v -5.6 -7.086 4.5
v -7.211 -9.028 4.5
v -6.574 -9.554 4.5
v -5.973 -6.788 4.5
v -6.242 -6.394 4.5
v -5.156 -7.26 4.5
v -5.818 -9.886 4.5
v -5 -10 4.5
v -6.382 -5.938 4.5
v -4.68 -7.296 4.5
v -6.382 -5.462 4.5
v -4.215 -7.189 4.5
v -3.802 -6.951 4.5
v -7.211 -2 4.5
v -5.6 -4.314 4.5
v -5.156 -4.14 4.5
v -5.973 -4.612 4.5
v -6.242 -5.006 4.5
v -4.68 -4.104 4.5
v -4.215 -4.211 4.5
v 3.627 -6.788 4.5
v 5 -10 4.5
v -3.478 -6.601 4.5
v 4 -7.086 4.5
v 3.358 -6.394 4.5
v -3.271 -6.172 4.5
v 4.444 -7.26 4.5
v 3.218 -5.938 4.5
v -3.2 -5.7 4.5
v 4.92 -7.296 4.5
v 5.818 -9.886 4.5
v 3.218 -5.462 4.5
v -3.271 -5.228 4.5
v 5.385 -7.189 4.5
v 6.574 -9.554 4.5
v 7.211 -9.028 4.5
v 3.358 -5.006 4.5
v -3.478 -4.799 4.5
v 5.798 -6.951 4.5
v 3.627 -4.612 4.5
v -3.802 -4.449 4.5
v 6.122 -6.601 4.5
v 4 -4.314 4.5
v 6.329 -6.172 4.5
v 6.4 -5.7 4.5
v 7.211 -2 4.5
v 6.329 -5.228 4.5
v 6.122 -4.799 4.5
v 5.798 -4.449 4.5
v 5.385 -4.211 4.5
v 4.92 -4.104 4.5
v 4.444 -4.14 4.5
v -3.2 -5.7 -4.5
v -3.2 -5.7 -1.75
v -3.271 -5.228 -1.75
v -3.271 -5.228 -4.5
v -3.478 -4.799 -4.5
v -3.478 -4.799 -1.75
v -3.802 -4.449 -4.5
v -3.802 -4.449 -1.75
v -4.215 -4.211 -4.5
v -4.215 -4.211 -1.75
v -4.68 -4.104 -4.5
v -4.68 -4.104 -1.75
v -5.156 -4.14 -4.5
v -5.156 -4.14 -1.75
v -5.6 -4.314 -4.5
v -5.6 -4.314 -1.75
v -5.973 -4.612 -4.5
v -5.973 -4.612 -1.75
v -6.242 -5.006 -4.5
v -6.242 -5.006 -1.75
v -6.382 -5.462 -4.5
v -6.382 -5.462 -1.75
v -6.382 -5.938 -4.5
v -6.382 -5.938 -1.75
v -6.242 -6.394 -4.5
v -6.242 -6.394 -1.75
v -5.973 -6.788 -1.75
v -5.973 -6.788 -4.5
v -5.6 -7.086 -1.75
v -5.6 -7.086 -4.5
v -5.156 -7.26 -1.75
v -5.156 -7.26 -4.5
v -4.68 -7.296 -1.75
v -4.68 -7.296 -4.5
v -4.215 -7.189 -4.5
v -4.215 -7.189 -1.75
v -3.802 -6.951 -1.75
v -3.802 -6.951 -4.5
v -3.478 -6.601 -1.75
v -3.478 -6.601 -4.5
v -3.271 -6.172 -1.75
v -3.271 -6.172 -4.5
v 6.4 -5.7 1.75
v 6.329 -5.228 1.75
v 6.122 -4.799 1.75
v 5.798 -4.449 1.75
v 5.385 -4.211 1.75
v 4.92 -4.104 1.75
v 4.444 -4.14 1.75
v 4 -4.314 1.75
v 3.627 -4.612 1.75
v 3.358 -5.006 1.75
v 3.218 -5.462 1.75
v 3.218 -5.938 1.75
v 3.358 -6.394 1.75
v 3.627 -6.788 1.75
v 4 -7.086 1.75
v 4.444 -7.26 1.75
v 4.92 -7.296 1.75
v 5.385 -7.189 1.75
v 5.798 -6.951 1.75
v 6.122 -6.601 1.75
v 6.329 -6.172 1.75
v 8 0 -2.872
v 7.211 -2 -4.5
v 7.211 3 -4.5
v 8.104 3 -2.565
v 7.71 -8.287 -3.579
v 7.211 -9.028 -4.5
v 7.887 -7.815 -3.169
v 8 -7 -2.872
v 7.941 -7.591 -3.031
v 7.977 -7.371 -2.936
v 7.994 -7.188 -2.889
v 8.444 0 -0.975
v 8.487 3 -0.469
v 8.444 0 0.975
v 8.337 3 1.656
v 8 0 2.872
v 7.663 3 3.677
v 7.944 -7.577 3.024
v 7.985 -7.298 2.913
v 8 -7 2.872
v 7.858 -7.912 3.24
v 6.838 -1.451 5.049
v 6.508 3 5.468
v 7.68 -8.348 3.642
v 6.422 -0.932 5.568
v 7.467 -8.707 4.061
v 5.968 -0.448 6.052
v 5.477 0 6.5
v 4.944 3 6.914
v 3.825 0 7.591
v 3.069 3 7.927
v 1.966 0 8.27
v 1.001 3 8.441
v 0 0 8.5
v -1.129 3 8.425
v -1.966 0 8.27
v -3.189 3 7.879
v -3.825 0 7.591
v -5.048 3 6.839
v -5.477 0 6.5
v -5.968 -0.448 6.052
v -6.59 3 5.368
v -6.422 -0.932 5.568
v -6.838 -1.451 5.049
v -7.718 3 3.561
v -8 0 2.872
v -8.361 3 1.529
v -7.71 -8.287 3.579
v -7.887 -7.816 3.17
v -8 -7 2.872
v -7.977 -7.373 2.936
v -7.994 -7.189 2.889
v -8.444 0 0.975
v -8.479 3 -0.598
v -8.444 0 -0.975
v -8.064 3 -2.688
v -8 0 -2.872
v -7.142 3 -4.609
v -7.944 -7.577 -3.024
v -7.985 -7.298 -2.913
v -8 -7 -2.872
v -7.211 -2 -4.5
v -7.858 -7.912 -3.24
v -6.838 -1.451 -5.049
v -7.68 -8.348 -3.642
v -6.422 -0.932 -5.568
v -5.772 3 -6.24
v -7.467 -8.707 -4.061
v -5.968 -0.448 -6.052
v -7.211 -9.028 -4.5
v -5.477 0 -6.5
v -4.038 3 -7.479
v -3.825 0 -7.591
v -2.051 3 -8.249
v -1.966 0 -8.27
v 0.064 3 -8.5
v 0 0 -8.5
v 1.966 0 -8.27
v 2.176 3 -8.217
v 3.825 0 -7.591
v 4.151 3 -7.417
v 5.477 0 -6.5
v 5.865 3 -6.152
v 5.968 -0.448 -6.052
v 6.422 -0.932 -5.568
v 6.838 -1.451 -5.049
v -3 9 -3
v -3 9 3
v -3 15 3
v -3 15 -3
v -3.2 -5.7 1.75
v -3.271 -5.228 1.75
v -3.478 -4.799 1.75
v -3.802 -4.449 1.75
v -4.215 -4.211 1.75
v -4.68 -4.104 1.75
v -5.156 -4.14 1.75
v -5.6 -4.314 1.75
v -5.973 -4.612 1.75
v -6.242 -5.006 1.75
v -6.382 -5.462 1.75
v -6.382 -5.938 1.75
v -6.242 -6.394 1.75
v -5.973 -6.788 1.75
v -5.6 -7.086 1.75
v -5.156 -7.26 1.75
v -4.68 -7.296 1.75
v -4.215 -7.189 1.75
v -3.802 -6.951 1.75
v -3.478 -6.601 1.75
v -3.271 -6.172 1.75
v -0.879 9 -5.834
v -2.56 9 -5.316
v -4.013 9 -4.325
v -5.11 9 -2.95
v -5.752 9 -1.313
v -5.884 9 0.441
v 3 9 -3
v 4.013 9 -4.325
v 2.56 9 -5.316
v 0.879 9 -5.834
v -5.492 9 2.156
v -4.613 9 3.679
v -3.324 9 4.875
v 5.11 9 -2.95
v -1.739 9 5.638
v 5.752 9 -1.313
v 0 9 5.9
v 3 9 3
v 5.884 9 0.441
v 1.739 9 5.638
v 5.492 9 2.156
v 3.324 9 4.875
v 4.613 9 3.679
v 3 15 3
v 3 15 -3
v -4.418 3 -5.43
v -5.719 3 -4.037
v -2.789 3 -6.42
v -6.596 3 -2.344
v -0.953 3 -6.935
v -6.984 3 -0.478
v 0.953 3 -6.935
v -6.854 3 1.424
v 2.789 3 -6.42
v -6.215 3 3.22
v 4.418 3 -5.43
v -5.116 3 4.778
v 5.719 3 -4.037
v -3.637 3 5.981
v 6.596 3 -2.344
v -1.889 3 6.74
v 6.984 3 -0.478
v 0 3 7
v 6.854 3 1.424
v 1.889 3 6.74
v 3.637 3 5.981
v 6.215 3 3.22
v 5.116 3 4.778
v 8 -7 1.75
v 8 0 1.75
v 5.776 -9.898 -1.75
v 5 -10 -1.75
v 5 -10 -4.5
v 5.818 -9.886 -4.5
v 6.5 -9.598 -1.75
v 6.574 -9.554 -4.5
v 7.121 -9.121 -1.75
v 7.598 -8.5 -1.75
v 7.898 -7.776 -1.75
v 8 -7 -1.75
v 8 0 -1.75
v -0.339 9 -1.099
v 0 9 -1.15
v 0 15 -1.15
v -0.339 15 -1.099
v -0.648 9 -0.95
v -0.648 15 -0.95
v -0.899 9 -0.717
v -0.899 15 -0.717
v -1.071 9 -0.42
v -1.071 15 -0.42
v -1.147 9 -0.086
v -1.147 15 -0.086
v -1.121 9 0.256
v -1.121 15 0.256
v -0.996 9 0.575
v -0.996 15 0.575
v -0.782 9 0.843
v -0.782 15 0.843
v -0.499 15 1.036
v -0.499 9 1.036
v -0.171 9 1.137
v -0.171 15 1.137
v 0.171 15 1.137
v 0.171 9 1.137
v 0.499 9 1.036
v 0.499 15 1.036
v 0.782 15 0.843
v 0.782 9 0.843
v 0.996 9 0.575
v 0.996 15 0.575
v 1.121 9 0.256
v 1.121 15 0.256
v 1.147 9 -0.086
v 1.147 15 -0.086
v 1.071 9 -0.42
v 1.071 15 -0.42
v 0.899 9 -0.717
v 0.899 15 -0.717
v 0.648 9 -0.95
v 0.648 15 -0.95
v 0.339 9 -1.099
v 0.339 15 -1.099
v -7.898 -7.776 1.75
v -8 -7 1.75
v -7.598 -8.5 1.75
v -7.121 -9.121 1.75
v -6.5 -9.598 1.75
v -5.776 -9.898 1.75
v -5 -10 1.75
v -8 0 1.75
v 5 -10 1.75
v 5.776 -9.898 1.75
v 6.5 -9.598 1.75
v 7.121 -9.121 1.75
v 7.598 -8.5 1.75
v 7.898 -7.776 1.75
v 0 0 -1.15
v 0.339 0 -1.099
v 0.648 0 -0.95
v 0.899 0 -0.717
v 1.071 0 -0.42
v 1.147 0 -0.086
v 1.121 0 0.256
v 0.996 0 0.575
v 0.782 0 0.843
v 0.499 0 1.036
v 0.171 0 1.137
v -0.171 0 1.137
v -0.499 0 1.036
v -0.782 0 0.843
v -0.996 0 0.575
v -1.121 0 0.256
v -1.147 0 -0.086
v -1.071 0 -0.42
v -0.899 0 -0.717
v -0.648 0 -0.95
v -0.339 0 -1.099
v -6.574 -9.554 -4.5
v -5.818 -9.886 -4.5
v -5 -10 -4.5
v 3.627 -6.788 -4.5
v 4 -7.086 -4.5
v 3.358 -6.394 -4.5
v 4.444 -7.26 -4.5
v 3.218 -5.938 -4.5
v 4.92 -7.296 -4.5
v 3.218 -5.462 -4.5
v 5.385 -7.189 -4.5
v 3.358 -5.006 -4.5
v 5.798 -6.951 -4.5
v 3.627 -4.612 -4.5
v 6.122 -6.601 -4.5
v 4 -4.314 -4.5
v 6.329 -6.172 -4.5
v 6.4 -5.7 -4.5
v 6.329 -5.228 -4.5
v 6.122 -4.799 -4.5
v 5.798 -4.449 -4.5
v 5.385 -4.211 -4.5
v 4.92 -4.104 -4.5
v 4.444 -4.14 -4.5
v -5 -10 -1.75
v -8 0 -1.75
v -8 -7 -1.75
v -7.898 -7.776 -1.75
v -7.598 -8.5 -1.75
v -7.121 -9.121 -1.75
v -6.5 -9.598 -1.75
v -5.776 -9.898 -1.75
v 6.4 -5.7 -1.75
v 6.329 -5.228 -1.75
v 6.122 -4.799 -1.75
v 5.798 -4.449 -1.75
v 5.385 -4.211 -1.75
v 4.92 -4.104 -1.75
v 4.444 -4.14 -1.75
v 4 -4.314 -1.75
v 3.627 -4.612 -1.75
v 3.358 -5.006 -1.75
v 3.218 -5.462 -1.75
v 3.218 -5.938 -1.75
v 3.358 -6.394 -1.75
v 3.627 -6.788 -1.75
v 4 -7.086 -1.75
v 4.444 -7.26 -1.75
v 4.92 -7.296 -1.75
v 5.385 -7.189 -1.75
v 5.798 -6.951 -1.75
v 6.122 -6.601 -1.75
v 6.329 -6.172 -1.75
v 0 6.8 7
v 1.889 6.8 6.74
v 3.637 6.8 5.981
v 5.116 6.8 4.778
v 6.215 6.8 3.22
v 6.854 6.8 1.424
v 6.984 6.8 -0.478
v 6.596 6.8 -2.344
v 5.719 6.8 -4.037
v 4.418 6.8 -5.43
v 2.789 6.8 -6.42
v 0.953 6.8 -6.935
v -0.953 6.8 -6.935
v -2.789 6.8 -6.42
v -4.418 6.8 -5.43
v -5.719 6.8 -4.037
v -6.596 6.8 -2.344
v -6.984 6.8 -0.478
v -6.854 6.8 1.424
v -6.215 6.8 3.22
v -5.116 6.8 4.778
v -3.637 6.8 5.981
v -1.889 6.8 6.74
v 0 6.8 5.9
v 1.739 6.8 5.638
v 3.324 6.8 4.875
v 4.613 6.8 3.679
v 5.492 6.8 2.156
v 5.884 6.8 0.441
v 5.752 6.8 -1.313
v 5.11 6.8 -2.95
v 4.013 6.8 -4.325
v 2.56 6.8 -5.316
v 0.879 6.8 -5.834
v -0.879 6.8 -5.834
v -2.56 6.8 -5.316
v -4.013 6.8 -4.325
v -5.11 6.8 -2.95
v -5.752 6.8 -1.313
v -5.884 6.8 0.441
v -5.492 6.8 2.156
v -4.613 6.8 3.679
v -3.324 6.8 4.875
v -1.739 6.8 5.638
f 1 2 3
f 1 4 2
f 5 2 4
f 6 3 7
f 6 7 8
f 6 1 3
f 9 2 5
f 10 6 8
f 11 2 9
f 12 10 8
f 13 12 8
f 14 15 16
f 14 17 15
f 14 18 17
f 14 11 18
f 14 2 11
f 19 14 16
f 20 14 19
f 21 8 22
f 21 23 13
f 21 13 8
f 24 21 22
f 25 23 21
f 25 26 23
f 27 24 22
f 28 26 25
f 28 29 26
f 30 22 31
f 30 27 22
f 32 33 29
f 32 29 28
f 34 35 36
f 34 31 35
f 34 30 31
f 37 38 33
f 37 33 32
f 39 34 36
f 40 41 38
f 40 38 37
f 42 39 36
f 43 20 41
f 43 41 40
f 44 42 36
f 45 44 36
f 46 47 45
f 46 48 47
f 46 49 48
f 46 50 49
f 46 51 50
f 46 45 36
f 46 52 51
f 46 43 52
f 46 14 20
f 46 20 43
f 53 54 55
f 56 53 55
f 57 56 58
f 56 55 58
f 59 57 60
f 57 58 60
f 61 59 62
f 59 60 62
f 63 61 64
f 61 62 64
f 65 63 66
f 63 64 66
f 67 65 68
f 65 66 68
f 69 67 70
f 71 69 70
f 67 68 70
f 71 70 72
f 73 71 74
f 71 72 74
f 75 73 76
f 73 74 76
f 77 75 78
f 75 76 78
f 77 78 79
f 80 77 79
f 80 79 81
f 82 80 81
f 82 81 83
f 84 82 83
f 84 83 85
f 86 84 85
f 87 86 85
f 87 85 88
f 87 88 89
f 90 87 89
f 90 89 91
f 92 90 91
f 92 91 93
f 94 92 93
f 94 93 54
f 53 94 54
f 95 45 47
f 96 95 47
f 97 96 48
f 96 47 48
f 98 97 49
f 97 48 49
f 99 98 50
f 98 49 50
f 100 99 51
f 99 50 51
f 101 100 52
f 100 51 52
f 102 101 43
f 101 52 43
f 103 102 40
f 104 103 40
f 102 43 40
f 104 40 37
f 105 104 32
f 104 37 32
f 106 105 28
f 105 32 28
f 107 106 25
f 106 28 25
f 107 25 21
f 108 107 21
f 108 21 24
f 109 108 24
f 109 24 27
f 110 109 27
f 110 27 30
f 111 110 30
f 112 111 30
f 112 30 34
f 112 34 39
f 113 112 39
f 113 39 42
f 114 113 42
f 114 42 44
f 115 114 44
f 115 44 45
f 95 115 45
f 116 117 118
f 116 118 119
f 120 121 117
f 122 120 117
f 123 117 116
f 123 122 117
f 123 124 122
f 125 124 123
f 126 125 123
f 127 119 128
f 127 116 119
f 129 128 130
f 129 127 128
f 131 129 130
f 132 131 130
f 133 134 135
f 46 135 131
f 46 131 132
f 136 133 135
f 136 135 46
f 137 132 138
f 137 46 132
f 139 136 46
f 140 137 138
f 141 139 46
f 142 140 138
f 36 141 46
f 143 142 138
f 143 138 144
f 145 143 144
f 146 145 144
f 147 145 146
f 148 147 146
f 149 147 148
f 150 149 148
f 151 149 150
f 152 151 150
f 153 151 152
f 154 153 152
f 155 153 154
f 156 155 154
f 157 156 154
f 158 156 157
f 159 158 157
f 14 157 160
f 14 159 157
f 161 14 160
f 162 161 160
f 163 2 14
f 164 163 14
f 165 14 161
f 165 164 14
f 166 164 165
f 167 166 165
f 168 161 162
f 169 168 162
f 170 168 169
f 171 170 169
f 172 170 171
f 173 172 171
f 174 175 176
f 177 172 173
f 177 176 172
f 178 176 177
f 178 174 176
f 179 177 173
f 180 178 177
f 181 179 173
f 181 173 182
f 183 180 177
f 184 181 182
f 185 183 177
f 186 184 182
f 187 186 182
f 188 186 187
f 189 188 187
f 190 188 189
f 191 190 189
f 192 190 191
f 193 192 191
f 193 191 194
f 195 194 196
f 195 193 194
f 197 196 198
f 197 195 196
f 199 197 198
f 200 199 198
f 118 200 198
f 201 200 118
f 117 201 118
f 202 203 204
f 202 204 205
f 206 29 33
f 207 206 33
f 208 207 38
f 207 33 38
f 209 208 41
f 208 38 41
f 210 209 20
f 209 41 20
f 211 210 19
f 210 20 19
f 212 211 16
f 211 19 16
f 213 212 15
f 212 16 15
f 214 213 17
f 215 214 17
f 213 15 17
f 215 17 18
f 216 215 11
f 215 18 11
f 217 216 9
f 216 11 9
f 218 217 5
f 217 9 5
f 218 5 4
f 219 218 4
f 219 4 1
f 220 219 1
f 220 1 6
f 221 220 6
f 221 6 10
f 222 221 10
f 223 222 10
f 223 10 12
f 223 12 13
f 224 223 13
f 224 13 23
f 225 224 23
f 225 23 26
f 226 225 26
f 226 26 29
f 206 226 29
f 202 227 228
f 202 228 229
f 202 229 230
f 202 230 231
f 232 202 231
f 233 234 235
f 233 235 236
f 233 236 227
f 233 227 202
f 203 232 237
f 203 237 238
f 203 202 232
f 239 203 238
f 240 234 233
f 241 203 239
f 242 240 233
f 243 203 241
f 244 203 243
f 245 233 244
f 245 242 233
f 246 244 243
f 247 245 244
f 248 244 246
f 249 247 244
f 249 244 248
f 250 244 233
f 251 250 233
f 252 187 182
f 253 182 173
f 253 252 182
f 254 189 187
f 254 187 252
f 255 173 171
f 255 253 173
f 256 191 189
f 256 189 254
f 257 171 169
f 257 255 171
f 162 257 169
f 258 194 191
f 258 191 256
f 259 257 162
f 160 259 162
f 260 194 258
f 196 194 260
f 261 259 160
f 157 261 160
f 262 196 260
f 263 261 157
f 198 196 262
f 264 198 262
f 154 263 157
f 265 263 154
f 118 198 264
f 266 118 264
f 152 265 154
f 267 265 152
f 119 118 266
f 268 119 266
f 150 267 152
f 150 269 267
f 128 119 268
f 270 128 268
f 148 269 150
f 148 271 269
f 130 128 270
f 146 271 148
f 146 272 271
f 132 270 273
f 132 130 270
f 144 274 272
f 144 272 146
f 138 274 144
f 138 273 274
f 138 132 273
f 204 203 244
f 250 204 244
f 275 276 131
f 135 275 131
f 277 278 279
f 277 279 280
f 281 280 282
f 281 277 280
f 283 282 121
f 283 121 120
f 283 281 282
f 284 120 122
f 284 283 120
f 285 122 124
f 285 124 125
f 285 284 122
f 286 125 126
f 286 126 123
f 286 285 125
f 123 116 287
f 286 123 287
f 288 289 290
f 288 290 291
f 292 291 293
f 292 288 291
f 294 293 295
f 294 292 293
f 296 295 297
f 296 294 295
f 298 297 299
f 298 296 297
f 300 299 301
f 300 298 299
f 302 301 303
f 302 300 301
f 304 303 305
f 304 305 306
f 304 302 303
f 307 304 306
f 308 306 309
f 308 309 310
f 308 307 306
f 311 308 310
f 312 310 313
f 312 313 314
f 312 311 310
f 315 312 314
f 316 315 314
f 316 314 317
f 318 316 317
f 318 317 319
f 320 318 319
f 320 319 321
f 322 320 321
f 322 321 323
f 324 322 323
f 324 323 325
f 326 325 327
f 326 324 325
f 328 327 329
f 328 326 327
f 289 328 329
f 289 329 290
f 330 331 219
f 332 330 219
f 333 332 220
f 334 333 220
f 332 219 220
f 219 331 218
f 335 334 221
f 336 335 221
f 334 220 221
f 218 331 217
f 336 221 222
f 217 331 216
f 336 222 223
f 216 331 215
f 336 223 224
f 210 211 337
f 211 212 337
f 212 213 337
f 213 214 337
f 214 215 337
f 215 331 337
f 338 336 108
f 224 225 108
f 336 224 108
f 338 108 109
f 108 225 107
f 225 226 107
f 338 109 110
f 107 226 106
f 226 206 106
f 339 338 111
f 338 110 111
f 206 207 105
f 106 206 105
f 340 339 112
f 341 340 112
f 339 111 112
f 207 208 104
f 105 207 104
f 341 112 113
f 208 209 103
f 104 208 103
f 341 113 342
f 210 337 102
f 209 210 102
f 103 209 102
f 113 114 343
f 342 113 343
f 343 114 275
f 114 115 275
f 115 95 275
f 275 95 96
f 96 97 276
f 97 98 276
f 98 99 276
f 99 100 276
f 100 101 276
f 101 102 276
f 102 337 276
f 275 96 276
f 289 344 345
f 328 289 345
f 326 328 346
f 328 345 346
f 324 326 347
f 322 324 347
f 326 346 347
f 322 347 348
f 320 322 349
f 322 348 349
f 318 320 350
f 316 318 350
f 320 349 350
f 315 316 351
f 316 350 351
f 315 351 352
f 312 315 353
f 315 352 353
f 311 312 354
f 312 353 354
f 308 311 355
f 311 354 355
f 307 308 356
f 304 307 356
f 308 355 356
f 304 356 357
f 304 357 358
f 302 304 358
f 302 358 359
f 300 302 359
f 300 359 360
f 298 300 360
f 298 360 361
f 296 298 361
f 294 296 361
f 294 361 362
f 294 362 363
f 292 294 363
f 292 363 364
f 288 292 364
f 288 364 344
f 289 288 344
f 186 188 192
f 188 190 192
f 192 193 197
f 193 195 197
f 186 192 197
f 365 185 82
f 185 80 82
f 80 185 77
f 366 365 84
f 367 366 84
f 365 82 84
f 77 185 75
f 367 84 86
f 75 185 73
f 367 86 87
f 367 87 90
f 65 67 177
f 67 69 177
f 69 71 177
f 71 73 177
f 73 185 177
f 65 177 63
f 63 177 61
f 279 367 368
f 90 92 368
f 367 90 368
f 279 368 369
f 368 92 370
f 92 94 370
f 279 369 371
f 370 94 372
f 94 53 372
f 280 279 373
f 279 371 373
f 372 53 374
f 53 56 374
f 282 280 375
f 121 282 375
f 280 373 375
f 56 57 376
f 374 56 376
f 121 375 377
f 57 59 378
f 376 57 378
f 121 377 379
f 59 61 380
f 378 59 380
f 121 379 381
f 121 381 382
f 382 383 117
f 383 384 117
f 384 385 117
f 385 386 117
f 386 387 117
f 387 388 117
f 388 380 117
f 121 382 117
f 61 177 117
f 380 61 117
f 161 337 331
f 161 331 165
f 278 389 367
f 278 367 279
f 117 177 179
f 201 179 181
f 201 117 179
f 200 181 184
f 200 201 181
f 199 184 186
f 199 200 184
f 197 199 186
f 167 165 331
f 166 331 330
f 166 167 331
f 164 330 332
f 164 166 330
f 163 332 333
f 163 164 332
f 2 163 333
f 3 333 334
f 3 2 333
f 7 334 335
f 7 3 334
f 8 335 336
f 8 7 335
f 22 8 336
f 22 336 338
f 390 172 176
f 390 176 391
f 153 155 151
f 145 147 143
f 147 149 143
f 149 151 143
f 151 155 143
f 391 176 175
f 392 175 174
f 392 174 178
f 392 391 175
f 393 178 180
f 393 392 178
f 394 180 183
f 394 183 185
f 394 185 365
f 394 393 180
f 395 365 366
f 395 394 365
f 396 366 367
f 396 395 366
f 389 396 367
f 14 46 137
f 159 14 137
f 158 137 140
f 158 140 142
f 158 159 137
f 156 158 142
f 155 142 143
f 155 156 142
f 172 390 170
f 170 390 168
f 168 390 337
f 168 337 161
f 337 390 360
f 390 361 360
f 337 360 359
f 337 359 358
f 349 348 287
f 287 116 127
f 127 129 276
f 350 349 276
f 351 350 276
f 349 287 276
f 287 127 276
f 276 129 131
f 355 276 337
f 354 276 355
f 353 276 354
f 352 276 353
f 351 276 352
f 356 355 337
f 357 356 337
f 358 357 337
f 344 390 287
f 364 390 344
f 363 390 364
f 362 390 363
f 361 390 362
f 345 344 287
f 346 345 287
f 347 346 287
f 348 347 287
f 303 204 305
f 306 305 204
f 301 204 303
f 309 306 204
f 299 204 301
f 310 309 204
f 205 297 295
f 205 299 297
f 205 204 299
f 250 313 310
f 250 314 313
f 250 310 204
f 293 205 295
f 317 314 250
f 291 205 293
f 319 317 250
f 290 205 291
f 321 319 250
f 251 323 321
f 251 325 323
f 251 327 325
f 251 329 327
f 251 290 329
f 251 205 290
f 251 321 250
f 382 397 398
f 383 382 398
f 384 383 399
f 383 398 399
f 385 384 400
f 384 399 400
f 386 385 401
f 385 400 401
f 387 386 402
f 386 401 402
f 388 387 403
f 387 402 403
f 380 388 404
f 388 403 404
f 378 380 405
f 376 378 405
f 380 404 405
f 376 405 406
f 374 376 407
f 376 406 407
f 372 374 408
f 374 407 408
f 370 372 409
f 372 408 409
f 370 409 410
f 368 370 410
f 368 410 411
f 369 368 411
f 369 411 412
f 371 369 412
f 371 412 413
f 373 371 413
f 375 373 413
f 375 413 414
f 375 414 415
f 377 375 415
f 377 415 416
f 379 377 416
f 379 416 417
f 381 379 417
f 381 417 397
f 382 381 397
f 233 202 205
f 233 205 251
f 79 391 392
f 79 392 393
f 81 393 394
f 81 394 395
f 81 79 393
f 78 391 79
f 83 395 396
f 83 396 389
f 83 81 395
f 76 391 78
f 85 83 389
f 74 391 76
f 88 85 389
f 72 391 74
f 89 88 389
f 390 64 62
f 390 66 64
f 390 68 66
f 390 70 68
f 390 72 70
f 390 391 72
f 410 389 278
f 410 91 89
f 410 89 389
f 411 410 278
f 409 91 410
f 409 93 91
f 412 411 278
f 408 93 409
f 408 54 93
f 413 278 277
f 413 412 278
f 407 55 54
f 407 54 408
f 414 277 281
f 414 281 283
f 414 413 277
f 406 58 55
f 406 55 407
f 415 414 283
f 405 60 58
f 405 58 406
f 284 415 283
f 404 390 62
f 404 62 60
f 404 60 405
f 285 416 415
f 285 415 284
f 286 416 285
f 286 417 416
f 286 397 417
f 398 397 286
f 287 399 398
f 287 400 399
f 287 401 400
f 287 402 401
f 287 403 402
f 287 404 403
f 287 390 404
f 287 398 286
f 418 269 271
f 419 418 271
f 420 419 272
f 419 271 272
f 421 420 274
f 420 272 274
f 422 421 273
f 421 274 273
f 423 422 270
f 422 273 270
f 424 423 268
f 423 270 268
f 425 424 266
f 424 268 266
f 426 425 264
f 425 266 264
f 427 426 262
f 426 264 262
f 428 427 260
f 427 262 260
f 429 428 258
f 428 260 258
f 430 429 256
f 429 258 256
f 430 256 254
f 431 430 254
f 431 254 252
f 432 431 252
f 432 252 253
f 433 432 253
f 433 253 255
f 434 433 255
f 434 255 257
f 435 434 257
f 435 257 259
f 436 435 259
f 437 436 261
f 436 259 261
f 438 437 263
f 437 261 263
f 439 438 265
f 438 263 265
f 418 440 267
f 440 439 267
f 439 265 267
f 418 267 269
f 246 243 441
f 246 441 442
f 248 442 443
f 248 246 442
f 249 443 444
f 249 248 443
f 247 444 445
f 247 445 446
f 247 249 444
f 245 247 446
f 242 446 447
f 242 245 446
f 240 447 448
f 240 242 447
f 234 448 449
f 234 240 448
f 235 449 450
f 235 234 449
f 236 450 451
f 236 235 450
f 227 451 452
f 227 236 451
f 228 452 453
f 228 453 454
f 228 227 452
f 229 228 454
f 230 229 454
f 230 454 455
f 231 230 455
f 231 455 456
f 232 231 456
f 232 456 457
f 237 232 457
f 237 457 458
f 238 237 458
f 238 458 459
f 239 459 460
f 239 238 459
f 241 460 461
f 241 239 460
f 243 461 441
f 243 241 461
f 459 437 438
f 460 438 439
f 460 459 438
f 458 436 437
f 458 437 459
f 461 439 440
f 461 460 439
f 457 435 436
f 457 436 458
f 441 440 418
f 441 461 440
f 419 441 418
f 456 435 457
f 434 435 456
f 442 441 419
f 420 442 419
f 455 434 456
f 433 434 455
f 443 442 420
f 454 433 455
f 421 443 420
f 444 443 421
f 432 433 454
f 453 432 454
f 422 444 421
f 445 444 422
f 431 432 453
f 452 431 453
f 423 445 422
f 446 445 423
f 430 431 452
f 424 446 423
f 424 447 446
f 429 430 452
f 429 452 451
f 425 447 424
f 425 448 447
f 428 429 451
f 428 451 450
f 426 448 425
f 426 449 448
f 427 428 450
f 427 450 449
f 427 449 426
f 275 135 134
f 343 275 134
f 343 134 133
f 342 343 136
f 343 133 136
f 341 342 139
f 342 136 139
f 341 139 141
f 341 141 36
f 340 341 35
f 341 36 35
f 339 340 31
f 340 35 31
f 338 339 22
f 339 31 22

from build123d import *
from build123d.topology import SkipClean

# Parameters (mm, degrees)
SKETCH_9_R          = 9
EXTRUDE_4_DEPTH     = 3
SKETCH_10_R         = 7
EXTRUDE_5_DEPTH     = 6
SKETCH_11_W         = 16
SKETCH_11_H         = 3
EXTRUDE_6_DEPTH     = 10
SKETCH_12_R         = 1.6
CUT_EXTRUDE_3_DEPTH = 20.059118553
SKETCH_13_R         = 12.035495365
SKETCH_13_R_2       = 9
CUT_EXTRUDE_4_DEPTH = 30
FILLET_1_R          = 3
SKETCH_14_R         = 1.15
CUT_EXTRUDE_5_DEPTH = 30
SKETCH_15_W         = 22.433214128
SKETCH_15_H         = 3.5
CUT_EXTRUDE_6_DEPTH = 20
SKETCH_17_R         = 12.049205959
SKETCH_17_R_2       = 8.5
CUT_EXTRUDE_7_DEPTH = 20
SKETCH_18_R         = 9.534410067
SKETCH_18_R_2       = 5.9
CUT_EXTRUDE_8_DEPTH = 2.2
SKETCH_20_W         = 6
SKETCH_20_H         = 6
SKETCH_20_R         = 1.15
EXTRUDE_7_DEPTH     = 6
CHAMFER_1_SIZE      = 2


with BuildPart() as part:
    # Эскиз9 → Бобышка-Вытянуть4 (new body)
    with BuildSketch(Plane(origin=(0, 0, 0), x_dir=(1, 0, 0), z_dir=(0, 1, 0))):
        with Locations(Location((0, 0, 0), (0, 0, 270))):
            Circle(SKETCH_9_R)
    extrude(amount=EXTRUDE_4_DEPTH)

    # Эскиз10 → Бобышка-Вытянуть5 (add)
    with BuildSketch(Plane(origin=(0, 3, 0), x_dir=(1, 0, 0), z_dir=(0, 1, 0))):
        with Locations(Location((0, 0, 0), (0, 0, 270))):
            Circle(SKETCH_10_R)
    extrude(amount=EXTRUDE_5_DEPTH)

    # Эскиз11 → Бобышка-Вытянуть6 (add)
    with BuildSketch(Plane.XZ):
        with Locations((0, -3)):
            Rectangle(SKETCH_11_W, SKETCH_11_H)
        with Locations((0, 3)):
            Rectangle(SKETCH_11_W, SKETCH_11_H)
    extrude(amount=EXTRUDE_6_DEPTH)

    # Эскиз12 → Вырез-Вытянуть3 (cut, through all)
    with BuildSketch(Plane.XY.offset(4.5)):
        with Locations((-4.8, -5.7)):
            Circle(SKETCH_12_R)
        with Locations((4.8, -5.7)):
            Circle(SKETCH_12_R)
    extrude(amount=-CUT_EXTRUDE_3_DEPTH, mode=Mode.SUBTRACT)

    # Эскиз13 → Вырез-Вытянуть4 (cut)
    with SkipClean():  # the faces are left unmerged after this step: merging them gives an invalid solid
        with BuildSketch(Plane.XZ.offset(10)):
            Circle(SKETCH_13_R)
            with Locations(Location((0, 0, 0), (0, 0, 210))):
                Circle(SKETCH_13_R_2, mode=Mode.SUBTRACT)
        extrude(amount=-CUT_EXTRUDE_4_DEPTH, mode=Mode.SUBTRACT)
    add(part.part.scale(1), mode=Mode.REPLACE)  # the faces are merged on a copy

    # Скругление1
    fillet_1_edges = [part.edges().sort_by_distance(p)[0] for p in [
        (-8, -10, -2.811552813),
        (8, -10, -2.811552813),
        (8, -10, 2.811552813),
        (-8, -10, 2.811552813),
    ]]
    fillet(fillet_1_edges, radius=FILLET_1_R)

    # Эскиз14 → Вырез-Вытянуть5 (cut)
    with BuildSketch(Plane.XZ):
        with Locations(Location((0, 0, 0), (0, 0, 270))):
            Circle(SKETCH_14_R)
    extrude(amount=-CUT_EXTRUDE_5_DEPTH, mode=Mode.SUBTRACT)

    # Эскиз15 → Вырез-Вытянуть6 (cut)
    with BuildSketch(Plane.XZ):
        Rectangle(SKETCH_15_W, SKETCH_15_H)
    extrude(amount=CUT_EXTRUDE_6_DEPTH, mode=Mode.SUBTRACT)

    # Эскиз17 → Вырез-Вытянуть7 (cut)
    with BuildSketch(Plane.XZ.offset(10)):
        Circle(SKETCH_17_R)
        with Locations(Location((0, 0, 0), (0, 0, 328.034281249))):
            Circle(SKETCH_17_R_2, mode=Mode.SUBTRACT)
    extrude(amount=-CUT_EXTRUDE_7_DEPTH, mode=Mode.SUBTRACT)

    # Эскиз18 → Вырез-Вытянуть8 (cut)
    with BuildSketch(Plane(origin=(0, 9, 0), x_dir=(1, 0, 0), z_dir=(0, 1, 0))):
        Circle(SKETCH_18_R)
        with Locations(Location((0, 0, 0), (0, 0, 270))):
            Circle(SKETCH_18_R_2, mode=Mode.SUBTRACT)
    extrude(amount=-CUT_EXTRUDE_8_DEPTH, mode=Mode.SUBTRACT)

    # Эскиз20 → Бобышка-Вытянуть7 (add)
    with SkipClean():  # the faces are left unmerged after this step: merging them gives an invalid solid
        with BuildSketch(Plane(origin=(0, 9, 0), x_dir=(1, 0, 0), z_dir=(0, 1, 0))):
            Rectangle(SKETCH_20_W, SKETCH_20_H)
            with Locations(Location((0, 0, 0), (0, 0, 90))):
                Circle(SKETCH_20_R, mode=Mode.SUBTRACT)
        extrude(amount=EXTRUDE_7_DEPTH)

    # Фаска1
    # the kernel refuses this chamfer: 2 mm, written as the material it adds along each edge
    with BuildSketch(Plane(origin=(12.354468527, 0, -4.5), x_dir=(0, -0.9996219169112968, 0.027495876610586494), z_dir=(-1, 0, 0))) as chamfer_1_piece_1_section:
        Polygon((CHAMFER_1_SIZE * 0.999621916911, -CHAMFER_1_SIZE * 0.0274958766106), (-CHAMFER_1_SIZE * 0.0274958766106, -CHAMFER_1_SIZE * 0.999621916911), (0, 0), align=None)
    chamfer_1_piece_1 = extrude(amount=24.708937054, mode=Mode.PRIVATE)
    chamfer_1_piece_1 = chamfer_1_piece_1 & Plane(origin=(0, -0.675834344, 0), x_dir=(0.8483650059896506, 0, -0.5294117647088891), z_dir=(0, -1, 0)) * Cylinder(8.5, 58, mode=Mode.PRIVATE)
    add(chamfer_1_piece_1)
    with BuildSketch(Plane(origin=(-12.354468527, 0, 4.5), x_dir=(0, -0.9996219169112968, -0.027495876610586494), z_dir=(1, 0, 0))) as chamfer_1_piece_2_section:
        Polygon((CHAMFER_1_SIZE * 0.999621916911, -CHAMFER_1_SIZE * 0.0274958766106), (-CHAMFER_1_SIZE * 0.0274958766106, -CHAMFER_1_SIZE * 0.999621916911), (0, 0), align=None)
    chamfer_1_piece_2 = extrude(amount=24.708937054, mode=Mode.PRIVATE)
    chamfer_1_piece_2 = chamfer_1_piece_2 & Plane(origin=(0, -0.675834348, 0), x_dir=(0.8483650059896506, 0, -0.5294117647088891), z_dir=(0, -1, 0)) * Cylinder(8.5, 58, mode=Mode.PRIVATE)
    add(chamfer_1_piece_2)


solid = part.part
